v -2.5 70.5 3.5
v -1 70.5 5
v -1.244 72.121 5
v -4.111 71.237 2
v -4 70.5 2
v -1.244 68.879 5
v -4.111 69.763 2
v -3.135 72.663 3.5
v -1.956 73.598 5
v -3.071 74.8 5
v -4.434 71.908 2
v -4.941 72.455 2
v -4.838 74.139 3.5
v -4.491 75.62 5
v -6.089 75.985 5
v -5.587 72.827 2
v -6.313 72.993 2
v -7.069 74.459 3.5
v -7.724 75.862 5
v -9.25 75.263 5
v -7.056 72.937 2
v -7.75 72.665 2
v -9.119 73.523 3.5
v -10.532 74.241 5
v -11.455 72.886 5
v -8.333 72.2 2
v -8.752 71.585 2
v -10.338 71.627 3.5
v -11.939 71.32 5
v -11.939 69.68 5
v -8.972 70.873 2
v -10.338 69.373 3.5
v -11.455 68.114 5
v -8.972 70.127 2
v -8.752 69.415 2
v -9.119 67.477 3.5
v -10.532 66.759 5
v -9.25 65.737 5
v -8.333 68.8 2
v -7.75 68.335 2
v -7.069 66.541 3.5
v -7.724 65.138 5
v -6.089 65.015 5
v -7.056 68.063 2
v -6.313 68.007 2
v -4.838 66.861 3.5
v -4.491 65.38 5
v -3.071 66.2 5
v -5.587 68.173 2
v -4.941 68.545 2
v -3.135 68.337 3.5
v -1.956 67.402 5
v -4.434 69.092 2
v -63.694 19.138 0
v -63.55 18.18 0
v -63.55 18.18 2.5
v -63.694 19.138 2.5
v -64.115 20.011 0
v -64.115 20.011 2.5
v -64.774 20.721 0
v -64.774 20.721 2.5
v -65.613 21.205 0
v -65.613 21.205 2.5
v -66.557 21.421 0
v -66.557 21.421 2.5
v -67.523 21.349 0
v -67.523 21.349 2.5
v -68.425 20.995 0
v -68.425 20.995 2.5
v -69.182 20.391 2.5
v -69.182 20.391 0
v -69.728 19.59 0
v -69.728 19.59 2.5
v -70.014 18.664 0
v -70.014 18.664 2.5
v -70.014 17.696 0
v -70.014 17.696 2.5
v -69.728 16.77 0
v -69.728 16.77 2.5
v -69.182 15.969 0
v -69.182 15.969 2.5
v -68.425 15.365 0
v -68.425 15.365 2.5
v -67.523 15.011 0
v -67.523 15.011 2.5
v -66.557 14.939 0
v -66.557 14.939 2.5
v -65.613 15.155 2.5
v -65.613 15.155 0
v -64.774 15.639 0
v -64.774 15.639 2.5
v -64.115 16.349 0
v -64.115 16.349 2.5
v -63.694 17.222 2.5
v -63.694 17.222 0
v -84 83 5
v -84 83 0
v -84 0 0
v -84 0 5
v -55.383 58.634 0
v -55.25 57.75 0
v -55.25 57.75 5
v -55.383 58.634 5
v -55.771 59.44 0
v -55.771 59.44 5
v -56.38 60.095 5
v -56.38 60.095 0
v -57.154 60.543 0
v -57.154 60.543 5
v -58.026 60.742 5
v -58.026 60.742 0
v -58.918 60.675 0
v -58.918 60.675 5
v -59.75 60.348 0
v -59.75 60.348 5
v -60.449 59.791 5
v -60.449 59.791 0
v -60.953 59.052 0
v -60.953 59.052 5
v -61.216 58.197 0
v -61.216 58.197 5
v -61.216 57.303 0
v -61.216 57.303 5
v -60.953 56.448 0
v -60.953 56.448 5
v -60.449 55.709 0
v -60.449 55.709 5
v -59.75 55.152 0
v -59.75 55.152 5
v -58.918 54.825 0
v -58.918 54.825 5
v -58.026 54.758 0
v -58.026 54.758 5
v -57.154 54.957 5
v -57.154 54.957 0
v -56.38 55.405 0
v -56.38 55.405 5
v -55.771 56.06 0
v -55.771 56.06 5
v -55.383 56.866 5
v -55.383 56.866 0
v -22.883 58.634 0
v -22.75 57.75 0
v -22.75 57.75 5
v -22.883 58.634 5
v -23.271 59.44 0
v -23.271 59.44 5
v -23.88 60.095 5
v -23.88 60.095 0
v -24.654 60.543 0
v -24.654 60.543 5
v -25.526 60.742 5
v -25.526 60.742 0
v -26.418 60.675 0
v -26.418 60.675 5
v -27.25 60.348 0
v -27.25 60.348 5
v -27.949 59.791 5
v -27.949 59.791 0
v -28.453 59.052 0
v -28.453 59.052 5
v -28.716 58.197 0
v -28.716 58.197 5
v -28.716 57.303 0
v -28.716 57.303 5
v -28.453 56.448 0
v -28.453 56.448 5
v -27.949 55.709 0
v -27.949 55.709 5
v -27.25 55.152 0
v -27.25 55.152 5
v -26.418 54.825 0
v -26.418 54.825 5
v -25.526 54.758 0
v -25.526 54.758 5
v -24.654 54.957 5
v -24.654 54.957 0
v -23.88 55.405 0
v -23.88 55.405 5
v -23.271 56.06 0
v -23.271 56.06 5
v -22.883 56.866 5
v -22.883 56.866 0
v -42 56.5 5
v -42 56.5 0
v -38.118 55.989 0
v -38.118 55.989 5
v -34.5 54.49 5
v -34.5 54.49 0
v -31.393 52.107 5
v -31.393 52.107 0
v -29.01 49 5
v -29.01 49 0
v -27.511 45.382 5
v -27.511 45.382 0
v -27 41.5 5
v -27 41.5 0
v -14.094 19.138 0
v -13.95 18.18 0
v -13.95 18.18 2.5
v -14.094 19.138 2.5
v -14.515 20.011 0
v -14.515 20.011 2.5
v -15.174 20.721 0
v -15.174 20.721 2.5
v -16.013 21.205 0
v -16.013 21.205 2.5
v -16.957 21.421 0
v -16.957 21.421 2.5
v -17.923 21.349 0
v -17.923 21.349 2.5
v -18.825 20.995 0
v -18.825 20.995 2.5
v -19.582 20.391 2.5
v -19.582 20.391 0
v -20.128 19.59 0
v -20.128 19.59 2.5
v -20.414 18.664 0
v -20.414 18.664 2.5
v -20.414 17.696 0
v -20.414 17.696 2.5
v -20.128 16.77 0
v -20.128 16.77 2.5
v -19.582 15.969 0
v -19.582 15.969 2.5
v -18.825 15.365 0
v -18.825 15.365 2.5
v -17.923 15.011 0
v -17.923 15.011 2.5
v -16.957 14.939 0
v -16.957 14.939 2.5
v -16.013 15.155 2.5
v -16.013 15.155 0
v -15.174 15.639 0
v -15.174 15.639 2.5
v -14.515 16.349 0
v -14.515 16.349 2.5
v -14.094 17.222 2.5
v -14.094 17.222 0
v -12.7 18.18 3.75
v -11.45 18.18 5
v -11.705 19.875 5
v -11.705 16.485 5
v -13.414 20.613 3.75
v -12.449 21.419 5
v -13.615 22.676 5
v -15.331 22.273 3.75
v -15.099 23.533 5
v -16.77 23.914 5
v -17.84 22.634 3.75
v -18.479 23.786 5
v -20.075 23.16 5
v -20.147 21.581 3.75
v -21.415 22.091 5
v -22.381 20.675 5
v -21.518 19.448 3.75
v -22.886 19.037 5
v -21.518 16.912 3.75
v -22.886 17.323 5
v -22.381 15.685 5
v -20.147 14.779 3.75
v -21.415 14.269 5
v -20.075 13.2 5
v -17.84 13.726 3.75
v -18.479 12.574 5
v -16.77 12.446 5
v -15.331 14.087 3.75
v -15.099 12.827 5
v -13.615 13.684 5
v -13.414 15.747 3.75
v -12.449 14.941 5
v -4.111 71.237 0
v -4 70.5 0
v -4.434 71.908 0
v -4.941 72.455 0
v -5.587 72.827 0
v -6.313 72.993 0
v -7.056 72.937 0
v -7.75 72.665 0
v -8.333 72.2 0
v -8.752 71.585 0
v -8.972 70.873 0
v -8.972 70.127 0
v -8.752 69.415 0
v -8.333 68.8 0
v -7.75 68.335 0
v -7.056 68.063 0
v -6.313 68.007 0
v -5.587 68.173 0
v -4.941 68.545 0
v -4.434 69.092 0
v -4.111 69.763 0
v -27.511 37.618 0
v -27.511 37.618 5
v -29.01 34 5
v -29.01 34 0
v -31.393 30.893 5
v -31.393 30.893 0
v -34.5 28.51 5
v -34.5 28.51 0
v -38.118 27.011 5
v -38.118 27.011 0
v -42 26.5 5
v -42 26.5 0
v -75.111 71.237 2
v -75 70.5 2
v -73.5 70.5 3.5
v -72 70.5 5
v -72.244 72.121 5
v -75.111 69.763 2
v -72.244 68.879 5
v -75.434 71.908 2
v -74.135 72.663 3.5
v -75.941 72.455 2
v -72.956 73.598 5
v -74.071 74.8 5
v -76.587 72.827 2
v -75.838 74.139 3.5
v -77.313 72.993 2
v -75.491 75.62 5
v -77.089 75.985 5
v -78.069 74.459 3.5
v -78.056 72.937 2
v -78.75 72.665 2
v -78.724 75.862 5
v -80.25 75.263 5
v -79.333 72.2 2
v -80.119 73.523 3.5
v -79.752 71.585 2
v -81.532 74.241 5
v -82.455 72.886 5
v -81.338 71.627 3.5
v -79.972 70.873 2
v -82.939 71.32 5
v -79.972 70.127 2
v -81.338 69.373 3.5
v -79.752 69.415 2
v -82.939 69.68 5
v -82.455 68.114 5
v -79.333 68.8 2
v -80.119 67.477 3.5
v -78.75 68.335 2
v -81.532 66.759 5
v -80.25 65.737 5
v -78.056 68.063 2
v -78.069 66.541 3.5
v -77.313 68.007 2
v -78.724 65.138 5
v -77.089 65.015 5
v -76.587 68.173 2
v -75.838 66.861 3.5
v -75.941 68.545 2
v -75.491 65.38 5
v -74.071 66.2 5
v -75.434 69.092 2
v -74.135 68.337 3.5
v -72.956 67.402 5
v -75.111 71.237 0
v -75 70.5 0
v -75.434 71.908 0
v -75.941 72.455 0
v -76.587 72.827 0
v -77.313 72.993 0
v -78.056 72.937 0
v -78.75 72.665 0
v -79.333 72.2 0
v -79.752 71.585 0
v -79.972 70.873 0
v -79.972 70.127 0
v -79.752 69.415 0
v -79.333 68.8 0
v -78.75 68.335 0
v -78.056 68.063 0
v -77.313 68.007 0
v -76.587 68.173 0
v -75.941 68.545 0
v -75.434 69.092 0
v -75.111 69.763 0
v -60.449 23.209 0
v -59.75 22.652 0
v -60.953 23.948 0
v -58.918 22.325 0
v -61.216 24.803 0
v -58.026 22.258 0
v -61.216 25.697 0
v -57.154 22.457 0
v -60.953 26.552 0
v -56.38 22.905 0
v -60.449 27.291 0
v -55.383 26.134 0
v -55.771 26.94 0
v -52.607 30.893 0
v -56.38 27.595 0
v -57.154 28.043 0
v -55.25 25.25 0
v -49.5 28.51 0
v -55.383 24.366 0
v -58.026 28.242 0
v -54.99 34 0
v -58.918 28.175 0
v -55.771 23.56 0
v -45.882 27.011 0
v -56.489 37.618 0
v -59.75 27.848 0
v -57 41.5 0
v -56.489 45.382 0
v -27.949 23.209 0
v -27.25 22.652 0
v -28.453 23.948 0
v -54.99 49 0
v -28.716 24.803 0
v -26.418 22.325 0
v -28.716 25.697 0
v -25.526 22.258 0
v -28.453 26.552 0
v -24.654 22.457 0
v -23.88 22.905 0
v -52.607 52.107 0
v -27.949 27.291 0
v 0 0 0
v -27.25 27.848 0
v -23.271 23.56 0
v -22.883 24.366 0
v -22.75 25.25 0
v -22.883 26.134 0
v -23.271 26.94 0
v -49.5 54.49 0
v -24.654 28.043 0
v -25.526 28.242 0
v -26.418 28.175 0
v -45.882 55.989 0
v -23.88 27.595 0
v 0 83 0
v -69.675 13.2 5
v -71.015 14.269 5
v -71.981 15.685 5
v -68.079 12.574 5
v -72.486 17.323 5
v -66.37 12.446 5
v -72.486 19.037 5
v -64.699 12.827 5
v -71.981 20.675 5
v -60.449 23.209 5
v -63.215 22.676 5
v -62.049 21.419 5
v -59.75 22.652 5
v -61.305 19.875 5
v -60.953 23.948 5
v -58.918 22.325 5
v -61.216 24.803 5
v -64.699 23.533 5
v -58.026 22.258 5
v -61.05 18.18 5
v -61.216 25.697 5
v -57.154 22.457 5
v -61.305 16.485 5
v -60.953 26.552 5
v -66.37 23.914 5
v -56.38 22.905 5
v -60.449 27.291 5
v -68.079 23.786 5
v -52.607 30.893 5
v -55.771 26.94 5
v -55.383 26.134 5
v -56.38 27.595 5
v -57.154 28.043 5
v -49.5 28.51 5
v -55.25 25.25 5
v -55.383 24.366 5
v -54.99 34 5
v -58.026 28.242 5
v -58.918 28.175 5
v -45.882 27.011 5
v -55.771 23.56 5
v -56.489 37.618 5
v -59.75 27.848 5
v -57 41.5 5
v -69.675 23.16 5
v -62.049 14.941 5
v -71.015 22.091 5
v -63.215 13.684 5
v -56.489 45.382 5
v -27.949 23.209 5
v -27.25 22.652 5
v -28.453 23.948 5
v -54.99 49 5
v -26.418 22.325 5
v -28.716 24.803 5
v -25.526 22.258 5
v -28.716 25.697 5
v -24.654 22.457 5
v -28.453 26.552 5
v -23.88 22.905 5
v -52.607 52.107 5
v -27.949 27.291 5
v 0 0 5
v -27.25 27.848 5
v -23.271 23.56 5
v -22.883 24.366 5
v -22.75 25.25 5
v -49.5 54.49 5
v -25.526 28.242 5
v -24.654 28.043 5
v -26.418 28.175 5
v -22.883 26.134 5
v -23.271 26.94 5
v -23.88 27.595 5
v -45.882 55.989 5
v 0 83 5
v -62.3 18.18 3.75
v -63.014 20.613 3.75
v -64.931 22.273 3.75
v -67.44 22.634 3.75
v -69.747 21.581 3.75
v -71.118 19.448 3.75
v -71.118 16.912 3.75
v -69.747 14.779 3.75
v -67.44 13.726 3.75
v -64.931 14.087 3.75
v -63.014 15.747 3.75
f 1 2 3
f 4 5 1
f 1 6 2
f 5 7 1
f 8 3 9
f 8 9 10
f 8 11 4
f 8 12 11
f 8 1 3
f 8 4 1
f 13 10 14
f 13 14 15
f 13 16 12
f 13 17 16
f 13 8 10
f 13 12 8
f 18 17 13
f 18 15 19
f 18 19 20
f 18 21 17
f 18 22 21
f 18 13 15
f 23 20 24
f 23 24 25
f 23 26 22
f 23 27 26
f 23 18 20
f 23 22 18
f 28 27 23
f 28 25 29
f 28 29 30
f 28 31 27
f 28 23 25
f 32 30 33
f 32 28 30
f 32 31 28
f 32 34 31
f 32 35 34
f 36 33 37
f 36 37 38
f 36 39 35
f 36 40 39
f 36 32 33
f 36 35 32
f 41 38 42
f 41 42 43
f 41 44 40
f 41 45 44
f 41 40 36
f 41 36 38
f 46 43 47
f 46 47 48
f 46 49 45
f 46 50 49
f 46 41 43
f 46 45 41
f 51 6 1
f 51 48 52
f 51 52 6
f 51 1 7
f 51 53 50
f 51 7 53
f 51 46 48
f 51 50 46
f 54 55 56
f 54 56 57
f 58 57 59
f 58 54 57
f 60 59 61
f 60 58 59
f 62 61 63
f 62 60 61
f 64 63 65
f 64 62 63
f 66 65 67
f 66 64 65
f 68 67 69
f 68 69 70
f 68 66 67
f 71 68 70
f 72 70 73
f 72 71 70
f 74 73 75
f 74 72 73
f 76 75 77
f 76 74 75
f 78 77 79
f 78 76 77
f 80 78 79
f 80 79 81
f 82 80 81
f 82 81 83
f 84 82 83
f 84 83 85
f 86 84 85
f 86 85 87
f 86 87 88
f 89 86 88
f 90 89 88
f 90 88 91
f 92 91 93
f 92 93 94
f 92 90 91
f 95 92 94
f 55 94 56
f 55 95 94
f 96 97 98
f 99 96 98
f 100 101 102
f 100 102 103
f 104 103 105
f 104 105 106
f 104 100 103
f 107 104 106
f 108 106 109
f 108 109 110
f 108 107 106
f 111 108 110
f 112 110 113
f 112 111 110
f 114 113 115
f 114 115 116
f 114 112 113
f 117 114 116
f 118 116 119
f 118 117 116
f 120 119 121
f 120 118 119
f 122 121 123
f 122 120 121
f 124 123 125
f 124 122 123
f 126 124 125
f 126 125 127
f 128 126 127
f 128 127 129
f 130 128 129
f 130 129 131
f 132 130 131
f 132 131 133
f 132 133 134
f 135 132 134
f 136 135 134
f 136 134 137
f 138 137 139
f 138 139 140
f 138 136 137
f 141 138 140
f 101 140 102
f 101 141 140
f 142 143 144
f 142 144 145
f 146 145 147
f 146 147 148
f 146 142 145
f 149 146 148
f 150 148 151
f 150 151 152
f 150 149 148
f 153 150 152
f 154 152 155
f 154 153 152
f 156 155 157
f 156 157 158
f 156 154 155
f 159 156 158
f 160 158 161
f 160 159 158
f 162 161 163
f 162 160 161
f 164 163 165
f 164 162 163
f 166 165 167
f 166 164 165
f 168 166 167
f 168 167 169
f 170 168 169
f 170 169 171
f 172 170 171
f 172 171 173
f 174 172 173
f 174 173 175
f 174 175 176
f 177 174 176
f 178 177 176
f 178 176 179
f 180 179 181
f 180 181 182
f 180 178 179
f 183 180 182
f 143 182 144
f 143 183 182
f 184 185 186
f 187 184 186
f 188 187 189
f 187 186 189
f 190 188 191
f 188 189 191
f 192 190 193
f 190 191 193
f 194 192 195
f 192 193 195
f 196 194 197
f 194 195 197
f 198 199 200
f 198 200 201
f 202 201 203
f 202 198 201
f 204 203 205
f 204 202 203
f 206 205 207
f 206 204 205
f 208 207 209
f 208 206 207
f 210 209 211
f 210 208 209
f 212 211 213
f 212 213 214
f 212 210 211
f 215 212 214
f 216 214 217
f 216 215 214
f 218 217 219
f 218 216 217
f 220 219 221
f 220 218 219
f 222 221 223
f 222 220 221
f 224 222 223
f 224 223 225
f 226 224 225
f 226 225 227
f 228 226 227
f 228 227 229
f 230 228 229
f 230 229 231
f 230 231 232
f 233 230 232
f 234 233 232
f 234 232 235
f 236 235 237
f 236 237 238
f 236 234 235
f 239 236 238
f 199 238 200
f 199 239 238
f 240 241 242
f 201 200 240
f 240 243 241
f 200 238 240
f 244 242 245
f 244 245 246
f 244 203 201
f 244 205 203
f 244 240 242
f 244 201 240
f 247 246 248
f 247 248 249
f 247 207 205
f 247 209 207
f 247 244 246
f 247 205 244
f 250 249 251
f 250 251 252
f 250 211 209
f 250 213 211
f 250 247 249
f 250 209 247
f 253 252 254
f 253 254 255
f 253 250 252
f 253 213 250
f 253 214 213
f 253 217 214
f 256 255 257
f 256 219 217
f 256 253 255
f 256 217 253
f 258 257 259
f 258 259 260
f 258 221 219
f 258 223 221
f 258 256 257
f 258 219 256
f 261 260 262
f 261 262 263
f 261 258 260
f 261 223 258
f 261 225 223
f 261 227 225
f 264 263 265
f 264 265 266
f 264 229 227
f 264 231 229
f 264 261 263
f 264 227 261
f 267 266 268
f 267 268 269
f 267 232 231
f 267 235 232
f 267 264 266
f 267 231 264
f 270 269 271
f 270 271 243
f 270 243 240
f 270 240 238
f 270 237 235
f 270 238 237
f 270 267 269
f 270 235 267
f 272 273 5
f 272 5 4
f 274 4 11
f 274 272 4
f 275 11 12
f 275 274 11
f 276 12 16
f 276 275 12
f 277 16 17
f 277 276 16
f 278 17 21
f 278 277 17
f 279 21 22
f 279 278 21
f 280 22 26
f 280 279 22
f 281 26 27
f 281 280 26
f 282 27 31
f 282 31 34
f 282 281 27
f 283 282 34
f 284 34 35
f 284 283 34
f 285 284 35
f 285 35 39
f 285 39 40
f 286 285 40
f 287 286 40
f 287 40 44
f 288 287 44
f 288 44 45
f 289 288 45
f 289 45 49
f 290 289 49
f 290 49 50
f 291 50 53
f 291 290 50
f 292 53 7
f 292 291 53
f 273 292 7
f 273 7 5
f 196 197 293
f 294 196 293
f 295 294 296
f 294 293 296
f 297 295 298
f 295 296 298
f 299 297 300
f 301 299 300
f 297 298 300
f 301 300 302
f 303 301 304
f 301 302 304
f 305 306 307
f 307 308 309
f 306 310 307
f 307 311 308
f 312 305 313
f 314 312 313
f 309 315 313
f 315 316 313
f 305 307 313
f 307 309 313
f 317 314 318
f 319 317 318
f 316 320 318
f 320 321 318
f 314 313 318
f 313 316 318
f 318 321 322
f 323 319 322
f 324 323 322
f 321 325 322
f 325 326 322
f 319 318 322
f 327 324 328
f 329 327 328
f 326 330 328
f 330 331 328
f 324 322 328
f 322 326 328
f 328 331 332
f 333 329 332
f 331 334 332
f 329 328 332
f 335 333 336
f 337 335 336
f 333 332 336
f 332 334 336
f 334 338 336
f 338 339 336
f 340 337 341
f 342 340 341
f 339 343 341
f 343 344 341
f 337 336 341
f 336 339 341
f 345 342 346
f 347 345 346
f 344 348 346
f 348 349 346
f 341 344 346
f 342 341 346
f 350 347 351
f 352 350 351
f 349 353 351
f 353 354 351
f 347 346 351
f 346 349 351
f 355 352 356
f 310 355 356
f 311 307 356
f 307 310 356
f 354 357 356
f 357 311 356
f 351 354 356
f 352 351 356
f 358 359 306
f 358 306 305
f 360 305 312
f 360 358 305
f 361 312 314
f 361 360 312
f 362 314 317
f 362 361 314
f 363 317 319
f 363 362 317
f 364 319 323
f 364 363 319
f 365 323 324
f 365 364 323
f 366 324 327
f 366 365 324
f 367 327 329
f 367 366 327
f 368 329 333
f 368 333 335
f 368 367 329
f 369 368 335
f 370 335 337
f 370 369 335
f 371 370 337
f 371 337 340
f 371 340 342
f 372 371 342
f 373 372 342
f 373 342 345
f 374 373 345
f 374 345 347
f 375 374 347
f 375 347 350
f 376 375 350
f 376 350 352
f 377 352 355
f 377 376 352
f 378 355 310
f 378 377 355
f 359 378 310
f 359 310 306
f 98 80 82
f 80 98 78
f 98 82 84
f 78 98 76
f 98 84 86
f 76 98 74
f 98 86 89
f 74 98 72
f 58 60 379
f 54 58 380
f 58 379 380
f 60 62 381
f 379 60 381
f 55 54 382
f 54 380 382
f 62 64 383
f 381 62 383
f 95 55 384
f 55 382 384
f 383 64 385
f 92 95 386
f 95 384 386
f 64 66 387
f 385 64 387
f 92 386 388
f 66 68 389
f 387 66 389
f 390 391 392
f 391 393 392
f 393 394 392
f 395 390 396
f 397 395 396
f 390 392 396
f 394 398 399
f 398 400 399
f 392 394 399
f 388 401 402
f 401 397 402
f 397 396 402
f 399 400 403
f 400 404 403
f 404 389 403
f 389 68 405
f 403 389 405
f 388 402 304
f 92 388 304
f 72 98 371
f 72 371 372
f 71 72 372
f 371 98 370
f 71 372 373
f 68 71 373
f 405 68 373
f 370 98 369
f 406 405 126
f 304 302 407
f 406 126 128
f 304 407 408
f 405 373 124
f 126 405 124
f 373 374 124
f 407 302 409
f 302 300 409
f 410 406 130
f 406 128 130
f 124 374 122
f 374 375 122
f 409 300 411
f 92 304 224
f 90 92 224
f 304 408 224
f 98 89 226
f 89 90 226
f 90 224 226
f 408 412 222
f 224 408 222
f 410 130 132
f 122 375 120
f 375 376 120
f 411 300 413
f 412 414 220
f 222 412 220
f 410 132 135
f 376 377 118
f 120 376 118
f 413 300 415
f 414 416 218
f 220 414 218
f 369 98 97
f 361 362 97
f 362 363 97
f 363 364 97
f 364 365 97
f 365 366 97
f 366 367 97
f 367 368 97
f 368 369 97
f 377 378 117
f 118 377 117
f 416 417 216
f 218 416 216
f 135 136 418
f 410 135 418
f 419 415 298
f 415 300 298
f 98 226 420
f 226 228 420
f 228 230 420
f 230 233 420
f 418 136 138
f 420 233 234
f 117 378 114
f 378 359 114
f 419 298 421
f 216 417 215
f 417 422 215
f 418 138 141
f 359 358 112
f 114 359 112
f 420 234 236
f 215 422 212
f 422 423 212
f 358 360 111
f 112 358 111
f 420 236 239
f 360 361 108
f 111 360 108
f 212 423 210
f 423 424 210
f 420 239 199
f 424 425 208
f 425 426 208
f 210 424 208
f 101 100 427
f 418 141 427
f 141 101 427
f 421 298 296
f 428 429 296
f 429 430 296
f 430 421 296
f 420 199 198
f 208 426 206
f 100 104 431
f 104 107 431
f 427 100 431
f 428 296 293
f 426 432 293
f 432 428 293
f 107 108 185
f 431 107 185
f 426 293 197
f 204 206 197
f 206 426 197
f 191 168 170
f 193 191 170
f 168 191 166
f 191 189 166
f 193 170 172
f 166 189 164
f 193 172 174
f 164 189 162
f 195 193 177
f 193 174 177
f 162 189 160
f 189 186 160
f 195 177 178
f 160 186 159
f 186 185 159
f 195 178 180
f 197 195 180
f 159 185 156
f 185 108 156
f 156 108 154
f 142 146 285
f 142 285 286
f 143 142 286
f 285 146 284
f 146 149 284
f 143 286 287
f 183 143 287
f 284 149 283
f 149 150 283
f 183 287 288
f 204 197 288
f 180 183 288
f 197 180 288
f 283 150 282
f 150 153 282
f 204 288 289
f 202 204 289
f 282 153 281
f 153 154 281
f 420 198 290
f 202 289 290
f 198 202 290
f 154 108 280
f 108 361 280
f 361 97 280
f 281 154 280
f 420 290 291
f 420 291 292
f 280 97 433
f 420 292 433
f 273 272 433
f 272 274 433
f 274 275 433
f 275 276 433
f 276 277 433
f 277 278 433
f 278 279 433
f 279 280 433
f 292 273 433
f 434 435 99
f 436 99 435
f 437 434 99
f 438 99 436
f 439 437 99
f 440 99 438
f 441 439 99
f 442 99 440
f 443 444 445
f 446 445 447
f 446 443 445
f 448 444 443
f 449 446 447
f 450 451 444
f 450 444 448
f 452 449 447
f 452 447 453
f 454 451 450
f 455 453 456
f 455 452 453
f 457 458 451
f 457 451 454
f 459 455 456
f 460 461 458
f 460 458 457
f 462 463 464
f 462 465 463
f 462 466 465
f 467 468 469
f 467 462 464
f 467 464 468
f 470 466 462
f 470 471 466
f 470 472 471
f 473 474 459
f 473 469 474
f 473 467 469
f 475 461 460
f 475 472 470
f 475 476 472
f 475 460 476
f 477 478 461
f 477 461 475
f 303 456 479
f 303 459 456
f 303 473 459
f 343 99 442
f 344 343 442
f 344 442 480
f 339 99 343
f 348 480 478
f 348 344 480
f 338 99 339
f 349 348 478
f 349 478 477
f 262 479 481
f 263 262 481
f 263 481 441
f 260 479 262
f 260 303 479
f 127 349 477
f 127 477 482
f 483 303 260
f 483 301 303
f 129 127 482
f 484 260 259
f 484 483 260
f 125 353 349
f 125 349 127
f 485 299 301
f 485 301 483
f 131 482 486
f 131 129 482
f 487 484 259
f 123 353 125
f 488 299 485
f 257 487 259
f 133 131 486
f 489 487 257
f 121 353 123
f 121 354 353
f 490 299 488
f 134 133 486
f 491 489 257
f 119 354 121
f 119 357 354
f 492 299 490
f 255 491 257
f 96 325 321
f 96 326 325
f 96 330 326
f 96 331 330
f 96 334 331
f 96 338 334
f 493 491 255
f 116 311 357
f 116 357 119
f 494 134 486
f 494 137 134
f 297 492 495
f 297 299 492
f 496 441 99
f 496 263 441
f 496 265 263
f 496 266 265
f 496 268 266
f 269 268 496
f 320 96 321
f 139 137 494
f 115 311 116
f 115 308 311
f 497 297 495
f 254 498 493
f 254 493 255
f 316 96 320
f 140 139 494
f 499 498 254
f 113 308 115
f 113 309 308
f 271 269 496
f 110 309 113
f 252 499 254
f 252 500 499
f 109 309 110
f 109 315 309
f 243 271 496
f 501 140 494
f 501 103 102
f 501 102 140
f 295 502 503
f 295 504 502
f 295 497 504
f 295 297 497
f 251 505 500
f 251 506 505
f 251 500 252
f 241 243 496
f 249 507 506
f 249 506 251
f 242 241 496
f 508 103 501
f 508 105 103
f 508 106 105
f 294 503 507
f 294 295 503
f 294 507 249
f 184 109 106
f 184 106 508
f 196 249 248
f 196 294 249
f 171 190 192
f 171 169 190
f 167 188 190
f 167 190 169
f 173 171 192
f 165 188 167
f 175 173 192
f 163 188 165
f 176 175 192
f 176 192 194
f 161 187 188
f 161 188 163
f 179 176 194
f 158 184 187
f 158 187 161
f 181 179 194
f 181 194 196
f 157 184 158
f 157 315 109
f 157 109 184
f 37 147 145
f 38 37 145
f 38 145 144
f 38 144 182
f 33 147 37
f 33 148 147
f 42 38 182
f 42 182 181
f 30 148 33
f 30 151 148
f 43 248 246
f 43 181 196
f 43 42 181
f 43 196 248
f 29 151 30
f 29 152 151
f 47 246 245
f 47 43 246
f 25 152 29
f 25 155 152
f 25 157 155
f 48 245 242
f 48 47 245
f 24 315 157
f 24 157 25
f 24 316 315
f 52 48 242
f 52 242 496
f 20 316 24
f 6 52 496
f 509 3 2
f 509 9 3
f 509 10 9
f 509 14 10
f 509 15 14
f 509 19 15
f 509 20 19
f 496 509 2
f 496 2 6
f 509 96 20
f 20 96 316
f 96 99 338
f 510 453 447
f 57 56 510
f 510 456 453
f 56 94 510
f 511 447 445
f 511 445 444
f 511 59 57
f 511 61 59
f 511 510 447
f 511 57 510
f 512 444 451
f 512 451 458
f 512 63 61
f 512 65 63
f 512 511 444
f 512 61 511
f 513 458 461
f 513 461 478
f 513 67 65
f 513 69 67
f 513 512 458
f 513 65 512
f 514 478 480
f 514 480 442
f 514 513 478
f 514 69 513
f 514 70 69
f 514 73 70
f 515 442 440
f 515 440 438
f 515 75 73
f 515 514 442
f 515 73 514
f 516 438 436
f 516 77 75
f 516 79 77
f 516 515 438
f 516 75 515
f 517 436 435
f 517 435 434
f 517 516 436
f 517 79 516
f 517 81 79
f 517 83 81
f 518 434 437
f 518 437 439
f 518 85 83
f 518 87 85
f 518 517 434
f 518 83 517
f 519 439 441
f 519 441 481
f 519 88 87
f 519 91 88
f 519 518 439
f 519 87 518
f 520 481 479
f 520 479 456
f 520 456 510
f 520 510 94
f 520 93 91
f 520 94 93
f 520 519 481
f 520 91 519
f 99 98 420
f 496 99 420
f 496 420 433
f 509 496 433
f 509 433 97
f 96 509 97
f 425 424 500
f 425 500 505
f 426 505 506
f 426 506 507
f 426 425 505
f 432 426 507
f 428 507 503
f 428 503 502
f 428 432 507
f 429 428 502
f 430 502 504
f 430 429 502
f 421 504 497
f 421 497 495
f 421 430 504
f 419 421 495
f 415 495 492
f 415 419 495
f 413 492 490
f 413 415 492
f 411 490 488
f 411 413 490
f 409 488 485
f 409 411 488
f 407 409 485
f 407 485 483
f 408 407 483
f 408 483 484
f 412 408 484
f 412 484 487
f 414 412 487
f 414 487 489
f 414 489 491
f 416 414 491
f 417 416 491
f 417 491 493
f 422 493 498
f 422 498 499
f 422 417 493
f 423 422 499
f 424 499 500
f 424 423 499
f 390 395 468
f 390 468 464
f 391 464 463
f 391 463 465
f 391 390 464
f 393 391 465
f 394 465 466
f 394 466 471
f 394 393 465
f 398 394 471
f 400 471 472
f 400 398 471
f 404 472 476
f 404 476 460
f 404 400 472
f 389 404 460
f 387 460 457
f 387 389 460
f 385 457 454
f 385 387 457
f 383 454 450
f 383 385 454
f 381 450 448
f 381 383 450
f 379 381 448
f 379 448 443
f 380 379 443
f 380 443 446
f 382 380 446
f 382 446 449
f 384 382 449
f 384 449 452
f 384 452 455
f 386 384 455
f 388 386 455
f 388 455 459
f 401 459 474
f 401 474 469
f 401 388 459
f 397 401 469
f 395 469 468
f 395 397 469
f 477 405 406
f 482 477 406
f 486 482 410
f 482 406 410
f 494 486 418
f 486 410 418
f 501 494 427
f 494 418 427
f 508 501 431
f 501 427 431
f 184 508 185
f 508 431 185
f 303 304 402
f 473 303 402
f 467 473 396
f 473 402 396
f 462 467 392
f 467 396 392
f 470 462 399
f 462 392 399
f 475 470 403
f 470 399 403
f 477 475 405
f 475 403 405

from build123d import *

# Parameters (mm, degrees)
F0_R     = 3.25
F0_R_2   = 3
F0_R_3   = 2.5
F1_DEPTH = 5
F2_SIZE  = 3
F3_SIZE  = 3
F4_SIZE  = 2.5
F5_SIZE  = 2.5


with BuildPart() as f1:
    # F0 (on Top) → F1 (new body)
    with BuildSketch(Plane.XY):
        with BuildLine():
            Line((-42, 0), (0, 0))
            Line((0, 0), (0, 41.5))
            Line((0, 41.5), (-27, 41.5))
            ThreePointArc((-27, 41.5), (-31.393398, 30.893398), (-42, 26.5))
            Line((-42, 26.5), (-42, 0))
        make_face()
        with Locations((-17.2, 18.18)):
            Circle(F0_R, mode=Mode.SUBTRACT)
        with Locations((-25.75, 25.25)):
            Circle(F0_R_2, mode=Mode.SUBTRACT)
        with BuildLine():
            Line((-84, 0), (-42, 0))
            Line((-42, 0), (-42, 26.5))
            ThreePointArc((-42, 26.5), (-52.606602, 30.893398), (-57, 41.5))
            Line((-57, 41.5), (-84, 41.5))
            Line((-84, 41.5), (-84, 0))
        make_face()
        with Locations((-66.8, 18.18)):
            Circle(F0_R, mode=Mode.SUBTRACT)
        with Locations((-58.25, 25.25)):
            Circle(F0_R_2, mode=Mode.SUBTRACT)
        with BuildLine():
            Line((-27, 41.5), (0, 41.5))
            Line((0, 41.5), (0, 83))
            Line((0, 83), (-42, 83))
            Line((-42, 83), (-42, 56.5))
            ThreePointArc((-42, 56.5), (-31.393398, 52.106602), (-27, 41.5))
        make_face()
        with Locations((-25.75, 57.75)):
            Circle(F0_R_2, mode=Mode.SUBTRACT)
        with Locations((-6.5, 70.5)):
            Circle(F0_R_3, mode=Mode.SUBTRACT)
        with BuildLine():
            Line((-84, 83), (-84, 41.5))
            Line((-84, 41.5), (-57, 41.5))
            ThreePointArc((-57, 41.5), (-52.606602, 52.106602), (-42, 56.5))
            Line((-42, 56.5), (-42, 83))
            Line((-42, 83), (-84, 83))
        make_face()
        with Locations((-58.25, 57.75)):
            Circle(F0_R_2, mode=Mode.SUBTRACT)
        with Locations((-77.5, 70.5)):
            Circle(F0_R_3, mode=Mode.SUBTRACT)
    extrude(amount=F1_DEPTH)

    # F2
    f2_edges = [f1.edges().sort_by_distance(p)[0] for p in [
        (-80, 70.5, 5),
    ]]
    chamfer(f2_edges, length=F2_SIZE)

    # F3
    f3_edges = [f1.edges().sort_by_distance(p)[0] for p in [
        (-9, 70.5, 5),
    ]]
    chamfer(f3_edges, length=F3_SIZE)

    # F4
    f4_edges = [f1.edges().sort_by_distance(p)[0] for p in [
        (-70.05, 18.18, 5),
    ]]
    chamfer(f4_edges, length=F4_SIZE)

    # F5
    f5_edges = [f1.edges().sort_by_distance(p)[0] for p in [
        (-20.45, 18.18, 5),
    ]]
    chamfer(f5_edges, length=F5_SIZE)


solid = f1.part
